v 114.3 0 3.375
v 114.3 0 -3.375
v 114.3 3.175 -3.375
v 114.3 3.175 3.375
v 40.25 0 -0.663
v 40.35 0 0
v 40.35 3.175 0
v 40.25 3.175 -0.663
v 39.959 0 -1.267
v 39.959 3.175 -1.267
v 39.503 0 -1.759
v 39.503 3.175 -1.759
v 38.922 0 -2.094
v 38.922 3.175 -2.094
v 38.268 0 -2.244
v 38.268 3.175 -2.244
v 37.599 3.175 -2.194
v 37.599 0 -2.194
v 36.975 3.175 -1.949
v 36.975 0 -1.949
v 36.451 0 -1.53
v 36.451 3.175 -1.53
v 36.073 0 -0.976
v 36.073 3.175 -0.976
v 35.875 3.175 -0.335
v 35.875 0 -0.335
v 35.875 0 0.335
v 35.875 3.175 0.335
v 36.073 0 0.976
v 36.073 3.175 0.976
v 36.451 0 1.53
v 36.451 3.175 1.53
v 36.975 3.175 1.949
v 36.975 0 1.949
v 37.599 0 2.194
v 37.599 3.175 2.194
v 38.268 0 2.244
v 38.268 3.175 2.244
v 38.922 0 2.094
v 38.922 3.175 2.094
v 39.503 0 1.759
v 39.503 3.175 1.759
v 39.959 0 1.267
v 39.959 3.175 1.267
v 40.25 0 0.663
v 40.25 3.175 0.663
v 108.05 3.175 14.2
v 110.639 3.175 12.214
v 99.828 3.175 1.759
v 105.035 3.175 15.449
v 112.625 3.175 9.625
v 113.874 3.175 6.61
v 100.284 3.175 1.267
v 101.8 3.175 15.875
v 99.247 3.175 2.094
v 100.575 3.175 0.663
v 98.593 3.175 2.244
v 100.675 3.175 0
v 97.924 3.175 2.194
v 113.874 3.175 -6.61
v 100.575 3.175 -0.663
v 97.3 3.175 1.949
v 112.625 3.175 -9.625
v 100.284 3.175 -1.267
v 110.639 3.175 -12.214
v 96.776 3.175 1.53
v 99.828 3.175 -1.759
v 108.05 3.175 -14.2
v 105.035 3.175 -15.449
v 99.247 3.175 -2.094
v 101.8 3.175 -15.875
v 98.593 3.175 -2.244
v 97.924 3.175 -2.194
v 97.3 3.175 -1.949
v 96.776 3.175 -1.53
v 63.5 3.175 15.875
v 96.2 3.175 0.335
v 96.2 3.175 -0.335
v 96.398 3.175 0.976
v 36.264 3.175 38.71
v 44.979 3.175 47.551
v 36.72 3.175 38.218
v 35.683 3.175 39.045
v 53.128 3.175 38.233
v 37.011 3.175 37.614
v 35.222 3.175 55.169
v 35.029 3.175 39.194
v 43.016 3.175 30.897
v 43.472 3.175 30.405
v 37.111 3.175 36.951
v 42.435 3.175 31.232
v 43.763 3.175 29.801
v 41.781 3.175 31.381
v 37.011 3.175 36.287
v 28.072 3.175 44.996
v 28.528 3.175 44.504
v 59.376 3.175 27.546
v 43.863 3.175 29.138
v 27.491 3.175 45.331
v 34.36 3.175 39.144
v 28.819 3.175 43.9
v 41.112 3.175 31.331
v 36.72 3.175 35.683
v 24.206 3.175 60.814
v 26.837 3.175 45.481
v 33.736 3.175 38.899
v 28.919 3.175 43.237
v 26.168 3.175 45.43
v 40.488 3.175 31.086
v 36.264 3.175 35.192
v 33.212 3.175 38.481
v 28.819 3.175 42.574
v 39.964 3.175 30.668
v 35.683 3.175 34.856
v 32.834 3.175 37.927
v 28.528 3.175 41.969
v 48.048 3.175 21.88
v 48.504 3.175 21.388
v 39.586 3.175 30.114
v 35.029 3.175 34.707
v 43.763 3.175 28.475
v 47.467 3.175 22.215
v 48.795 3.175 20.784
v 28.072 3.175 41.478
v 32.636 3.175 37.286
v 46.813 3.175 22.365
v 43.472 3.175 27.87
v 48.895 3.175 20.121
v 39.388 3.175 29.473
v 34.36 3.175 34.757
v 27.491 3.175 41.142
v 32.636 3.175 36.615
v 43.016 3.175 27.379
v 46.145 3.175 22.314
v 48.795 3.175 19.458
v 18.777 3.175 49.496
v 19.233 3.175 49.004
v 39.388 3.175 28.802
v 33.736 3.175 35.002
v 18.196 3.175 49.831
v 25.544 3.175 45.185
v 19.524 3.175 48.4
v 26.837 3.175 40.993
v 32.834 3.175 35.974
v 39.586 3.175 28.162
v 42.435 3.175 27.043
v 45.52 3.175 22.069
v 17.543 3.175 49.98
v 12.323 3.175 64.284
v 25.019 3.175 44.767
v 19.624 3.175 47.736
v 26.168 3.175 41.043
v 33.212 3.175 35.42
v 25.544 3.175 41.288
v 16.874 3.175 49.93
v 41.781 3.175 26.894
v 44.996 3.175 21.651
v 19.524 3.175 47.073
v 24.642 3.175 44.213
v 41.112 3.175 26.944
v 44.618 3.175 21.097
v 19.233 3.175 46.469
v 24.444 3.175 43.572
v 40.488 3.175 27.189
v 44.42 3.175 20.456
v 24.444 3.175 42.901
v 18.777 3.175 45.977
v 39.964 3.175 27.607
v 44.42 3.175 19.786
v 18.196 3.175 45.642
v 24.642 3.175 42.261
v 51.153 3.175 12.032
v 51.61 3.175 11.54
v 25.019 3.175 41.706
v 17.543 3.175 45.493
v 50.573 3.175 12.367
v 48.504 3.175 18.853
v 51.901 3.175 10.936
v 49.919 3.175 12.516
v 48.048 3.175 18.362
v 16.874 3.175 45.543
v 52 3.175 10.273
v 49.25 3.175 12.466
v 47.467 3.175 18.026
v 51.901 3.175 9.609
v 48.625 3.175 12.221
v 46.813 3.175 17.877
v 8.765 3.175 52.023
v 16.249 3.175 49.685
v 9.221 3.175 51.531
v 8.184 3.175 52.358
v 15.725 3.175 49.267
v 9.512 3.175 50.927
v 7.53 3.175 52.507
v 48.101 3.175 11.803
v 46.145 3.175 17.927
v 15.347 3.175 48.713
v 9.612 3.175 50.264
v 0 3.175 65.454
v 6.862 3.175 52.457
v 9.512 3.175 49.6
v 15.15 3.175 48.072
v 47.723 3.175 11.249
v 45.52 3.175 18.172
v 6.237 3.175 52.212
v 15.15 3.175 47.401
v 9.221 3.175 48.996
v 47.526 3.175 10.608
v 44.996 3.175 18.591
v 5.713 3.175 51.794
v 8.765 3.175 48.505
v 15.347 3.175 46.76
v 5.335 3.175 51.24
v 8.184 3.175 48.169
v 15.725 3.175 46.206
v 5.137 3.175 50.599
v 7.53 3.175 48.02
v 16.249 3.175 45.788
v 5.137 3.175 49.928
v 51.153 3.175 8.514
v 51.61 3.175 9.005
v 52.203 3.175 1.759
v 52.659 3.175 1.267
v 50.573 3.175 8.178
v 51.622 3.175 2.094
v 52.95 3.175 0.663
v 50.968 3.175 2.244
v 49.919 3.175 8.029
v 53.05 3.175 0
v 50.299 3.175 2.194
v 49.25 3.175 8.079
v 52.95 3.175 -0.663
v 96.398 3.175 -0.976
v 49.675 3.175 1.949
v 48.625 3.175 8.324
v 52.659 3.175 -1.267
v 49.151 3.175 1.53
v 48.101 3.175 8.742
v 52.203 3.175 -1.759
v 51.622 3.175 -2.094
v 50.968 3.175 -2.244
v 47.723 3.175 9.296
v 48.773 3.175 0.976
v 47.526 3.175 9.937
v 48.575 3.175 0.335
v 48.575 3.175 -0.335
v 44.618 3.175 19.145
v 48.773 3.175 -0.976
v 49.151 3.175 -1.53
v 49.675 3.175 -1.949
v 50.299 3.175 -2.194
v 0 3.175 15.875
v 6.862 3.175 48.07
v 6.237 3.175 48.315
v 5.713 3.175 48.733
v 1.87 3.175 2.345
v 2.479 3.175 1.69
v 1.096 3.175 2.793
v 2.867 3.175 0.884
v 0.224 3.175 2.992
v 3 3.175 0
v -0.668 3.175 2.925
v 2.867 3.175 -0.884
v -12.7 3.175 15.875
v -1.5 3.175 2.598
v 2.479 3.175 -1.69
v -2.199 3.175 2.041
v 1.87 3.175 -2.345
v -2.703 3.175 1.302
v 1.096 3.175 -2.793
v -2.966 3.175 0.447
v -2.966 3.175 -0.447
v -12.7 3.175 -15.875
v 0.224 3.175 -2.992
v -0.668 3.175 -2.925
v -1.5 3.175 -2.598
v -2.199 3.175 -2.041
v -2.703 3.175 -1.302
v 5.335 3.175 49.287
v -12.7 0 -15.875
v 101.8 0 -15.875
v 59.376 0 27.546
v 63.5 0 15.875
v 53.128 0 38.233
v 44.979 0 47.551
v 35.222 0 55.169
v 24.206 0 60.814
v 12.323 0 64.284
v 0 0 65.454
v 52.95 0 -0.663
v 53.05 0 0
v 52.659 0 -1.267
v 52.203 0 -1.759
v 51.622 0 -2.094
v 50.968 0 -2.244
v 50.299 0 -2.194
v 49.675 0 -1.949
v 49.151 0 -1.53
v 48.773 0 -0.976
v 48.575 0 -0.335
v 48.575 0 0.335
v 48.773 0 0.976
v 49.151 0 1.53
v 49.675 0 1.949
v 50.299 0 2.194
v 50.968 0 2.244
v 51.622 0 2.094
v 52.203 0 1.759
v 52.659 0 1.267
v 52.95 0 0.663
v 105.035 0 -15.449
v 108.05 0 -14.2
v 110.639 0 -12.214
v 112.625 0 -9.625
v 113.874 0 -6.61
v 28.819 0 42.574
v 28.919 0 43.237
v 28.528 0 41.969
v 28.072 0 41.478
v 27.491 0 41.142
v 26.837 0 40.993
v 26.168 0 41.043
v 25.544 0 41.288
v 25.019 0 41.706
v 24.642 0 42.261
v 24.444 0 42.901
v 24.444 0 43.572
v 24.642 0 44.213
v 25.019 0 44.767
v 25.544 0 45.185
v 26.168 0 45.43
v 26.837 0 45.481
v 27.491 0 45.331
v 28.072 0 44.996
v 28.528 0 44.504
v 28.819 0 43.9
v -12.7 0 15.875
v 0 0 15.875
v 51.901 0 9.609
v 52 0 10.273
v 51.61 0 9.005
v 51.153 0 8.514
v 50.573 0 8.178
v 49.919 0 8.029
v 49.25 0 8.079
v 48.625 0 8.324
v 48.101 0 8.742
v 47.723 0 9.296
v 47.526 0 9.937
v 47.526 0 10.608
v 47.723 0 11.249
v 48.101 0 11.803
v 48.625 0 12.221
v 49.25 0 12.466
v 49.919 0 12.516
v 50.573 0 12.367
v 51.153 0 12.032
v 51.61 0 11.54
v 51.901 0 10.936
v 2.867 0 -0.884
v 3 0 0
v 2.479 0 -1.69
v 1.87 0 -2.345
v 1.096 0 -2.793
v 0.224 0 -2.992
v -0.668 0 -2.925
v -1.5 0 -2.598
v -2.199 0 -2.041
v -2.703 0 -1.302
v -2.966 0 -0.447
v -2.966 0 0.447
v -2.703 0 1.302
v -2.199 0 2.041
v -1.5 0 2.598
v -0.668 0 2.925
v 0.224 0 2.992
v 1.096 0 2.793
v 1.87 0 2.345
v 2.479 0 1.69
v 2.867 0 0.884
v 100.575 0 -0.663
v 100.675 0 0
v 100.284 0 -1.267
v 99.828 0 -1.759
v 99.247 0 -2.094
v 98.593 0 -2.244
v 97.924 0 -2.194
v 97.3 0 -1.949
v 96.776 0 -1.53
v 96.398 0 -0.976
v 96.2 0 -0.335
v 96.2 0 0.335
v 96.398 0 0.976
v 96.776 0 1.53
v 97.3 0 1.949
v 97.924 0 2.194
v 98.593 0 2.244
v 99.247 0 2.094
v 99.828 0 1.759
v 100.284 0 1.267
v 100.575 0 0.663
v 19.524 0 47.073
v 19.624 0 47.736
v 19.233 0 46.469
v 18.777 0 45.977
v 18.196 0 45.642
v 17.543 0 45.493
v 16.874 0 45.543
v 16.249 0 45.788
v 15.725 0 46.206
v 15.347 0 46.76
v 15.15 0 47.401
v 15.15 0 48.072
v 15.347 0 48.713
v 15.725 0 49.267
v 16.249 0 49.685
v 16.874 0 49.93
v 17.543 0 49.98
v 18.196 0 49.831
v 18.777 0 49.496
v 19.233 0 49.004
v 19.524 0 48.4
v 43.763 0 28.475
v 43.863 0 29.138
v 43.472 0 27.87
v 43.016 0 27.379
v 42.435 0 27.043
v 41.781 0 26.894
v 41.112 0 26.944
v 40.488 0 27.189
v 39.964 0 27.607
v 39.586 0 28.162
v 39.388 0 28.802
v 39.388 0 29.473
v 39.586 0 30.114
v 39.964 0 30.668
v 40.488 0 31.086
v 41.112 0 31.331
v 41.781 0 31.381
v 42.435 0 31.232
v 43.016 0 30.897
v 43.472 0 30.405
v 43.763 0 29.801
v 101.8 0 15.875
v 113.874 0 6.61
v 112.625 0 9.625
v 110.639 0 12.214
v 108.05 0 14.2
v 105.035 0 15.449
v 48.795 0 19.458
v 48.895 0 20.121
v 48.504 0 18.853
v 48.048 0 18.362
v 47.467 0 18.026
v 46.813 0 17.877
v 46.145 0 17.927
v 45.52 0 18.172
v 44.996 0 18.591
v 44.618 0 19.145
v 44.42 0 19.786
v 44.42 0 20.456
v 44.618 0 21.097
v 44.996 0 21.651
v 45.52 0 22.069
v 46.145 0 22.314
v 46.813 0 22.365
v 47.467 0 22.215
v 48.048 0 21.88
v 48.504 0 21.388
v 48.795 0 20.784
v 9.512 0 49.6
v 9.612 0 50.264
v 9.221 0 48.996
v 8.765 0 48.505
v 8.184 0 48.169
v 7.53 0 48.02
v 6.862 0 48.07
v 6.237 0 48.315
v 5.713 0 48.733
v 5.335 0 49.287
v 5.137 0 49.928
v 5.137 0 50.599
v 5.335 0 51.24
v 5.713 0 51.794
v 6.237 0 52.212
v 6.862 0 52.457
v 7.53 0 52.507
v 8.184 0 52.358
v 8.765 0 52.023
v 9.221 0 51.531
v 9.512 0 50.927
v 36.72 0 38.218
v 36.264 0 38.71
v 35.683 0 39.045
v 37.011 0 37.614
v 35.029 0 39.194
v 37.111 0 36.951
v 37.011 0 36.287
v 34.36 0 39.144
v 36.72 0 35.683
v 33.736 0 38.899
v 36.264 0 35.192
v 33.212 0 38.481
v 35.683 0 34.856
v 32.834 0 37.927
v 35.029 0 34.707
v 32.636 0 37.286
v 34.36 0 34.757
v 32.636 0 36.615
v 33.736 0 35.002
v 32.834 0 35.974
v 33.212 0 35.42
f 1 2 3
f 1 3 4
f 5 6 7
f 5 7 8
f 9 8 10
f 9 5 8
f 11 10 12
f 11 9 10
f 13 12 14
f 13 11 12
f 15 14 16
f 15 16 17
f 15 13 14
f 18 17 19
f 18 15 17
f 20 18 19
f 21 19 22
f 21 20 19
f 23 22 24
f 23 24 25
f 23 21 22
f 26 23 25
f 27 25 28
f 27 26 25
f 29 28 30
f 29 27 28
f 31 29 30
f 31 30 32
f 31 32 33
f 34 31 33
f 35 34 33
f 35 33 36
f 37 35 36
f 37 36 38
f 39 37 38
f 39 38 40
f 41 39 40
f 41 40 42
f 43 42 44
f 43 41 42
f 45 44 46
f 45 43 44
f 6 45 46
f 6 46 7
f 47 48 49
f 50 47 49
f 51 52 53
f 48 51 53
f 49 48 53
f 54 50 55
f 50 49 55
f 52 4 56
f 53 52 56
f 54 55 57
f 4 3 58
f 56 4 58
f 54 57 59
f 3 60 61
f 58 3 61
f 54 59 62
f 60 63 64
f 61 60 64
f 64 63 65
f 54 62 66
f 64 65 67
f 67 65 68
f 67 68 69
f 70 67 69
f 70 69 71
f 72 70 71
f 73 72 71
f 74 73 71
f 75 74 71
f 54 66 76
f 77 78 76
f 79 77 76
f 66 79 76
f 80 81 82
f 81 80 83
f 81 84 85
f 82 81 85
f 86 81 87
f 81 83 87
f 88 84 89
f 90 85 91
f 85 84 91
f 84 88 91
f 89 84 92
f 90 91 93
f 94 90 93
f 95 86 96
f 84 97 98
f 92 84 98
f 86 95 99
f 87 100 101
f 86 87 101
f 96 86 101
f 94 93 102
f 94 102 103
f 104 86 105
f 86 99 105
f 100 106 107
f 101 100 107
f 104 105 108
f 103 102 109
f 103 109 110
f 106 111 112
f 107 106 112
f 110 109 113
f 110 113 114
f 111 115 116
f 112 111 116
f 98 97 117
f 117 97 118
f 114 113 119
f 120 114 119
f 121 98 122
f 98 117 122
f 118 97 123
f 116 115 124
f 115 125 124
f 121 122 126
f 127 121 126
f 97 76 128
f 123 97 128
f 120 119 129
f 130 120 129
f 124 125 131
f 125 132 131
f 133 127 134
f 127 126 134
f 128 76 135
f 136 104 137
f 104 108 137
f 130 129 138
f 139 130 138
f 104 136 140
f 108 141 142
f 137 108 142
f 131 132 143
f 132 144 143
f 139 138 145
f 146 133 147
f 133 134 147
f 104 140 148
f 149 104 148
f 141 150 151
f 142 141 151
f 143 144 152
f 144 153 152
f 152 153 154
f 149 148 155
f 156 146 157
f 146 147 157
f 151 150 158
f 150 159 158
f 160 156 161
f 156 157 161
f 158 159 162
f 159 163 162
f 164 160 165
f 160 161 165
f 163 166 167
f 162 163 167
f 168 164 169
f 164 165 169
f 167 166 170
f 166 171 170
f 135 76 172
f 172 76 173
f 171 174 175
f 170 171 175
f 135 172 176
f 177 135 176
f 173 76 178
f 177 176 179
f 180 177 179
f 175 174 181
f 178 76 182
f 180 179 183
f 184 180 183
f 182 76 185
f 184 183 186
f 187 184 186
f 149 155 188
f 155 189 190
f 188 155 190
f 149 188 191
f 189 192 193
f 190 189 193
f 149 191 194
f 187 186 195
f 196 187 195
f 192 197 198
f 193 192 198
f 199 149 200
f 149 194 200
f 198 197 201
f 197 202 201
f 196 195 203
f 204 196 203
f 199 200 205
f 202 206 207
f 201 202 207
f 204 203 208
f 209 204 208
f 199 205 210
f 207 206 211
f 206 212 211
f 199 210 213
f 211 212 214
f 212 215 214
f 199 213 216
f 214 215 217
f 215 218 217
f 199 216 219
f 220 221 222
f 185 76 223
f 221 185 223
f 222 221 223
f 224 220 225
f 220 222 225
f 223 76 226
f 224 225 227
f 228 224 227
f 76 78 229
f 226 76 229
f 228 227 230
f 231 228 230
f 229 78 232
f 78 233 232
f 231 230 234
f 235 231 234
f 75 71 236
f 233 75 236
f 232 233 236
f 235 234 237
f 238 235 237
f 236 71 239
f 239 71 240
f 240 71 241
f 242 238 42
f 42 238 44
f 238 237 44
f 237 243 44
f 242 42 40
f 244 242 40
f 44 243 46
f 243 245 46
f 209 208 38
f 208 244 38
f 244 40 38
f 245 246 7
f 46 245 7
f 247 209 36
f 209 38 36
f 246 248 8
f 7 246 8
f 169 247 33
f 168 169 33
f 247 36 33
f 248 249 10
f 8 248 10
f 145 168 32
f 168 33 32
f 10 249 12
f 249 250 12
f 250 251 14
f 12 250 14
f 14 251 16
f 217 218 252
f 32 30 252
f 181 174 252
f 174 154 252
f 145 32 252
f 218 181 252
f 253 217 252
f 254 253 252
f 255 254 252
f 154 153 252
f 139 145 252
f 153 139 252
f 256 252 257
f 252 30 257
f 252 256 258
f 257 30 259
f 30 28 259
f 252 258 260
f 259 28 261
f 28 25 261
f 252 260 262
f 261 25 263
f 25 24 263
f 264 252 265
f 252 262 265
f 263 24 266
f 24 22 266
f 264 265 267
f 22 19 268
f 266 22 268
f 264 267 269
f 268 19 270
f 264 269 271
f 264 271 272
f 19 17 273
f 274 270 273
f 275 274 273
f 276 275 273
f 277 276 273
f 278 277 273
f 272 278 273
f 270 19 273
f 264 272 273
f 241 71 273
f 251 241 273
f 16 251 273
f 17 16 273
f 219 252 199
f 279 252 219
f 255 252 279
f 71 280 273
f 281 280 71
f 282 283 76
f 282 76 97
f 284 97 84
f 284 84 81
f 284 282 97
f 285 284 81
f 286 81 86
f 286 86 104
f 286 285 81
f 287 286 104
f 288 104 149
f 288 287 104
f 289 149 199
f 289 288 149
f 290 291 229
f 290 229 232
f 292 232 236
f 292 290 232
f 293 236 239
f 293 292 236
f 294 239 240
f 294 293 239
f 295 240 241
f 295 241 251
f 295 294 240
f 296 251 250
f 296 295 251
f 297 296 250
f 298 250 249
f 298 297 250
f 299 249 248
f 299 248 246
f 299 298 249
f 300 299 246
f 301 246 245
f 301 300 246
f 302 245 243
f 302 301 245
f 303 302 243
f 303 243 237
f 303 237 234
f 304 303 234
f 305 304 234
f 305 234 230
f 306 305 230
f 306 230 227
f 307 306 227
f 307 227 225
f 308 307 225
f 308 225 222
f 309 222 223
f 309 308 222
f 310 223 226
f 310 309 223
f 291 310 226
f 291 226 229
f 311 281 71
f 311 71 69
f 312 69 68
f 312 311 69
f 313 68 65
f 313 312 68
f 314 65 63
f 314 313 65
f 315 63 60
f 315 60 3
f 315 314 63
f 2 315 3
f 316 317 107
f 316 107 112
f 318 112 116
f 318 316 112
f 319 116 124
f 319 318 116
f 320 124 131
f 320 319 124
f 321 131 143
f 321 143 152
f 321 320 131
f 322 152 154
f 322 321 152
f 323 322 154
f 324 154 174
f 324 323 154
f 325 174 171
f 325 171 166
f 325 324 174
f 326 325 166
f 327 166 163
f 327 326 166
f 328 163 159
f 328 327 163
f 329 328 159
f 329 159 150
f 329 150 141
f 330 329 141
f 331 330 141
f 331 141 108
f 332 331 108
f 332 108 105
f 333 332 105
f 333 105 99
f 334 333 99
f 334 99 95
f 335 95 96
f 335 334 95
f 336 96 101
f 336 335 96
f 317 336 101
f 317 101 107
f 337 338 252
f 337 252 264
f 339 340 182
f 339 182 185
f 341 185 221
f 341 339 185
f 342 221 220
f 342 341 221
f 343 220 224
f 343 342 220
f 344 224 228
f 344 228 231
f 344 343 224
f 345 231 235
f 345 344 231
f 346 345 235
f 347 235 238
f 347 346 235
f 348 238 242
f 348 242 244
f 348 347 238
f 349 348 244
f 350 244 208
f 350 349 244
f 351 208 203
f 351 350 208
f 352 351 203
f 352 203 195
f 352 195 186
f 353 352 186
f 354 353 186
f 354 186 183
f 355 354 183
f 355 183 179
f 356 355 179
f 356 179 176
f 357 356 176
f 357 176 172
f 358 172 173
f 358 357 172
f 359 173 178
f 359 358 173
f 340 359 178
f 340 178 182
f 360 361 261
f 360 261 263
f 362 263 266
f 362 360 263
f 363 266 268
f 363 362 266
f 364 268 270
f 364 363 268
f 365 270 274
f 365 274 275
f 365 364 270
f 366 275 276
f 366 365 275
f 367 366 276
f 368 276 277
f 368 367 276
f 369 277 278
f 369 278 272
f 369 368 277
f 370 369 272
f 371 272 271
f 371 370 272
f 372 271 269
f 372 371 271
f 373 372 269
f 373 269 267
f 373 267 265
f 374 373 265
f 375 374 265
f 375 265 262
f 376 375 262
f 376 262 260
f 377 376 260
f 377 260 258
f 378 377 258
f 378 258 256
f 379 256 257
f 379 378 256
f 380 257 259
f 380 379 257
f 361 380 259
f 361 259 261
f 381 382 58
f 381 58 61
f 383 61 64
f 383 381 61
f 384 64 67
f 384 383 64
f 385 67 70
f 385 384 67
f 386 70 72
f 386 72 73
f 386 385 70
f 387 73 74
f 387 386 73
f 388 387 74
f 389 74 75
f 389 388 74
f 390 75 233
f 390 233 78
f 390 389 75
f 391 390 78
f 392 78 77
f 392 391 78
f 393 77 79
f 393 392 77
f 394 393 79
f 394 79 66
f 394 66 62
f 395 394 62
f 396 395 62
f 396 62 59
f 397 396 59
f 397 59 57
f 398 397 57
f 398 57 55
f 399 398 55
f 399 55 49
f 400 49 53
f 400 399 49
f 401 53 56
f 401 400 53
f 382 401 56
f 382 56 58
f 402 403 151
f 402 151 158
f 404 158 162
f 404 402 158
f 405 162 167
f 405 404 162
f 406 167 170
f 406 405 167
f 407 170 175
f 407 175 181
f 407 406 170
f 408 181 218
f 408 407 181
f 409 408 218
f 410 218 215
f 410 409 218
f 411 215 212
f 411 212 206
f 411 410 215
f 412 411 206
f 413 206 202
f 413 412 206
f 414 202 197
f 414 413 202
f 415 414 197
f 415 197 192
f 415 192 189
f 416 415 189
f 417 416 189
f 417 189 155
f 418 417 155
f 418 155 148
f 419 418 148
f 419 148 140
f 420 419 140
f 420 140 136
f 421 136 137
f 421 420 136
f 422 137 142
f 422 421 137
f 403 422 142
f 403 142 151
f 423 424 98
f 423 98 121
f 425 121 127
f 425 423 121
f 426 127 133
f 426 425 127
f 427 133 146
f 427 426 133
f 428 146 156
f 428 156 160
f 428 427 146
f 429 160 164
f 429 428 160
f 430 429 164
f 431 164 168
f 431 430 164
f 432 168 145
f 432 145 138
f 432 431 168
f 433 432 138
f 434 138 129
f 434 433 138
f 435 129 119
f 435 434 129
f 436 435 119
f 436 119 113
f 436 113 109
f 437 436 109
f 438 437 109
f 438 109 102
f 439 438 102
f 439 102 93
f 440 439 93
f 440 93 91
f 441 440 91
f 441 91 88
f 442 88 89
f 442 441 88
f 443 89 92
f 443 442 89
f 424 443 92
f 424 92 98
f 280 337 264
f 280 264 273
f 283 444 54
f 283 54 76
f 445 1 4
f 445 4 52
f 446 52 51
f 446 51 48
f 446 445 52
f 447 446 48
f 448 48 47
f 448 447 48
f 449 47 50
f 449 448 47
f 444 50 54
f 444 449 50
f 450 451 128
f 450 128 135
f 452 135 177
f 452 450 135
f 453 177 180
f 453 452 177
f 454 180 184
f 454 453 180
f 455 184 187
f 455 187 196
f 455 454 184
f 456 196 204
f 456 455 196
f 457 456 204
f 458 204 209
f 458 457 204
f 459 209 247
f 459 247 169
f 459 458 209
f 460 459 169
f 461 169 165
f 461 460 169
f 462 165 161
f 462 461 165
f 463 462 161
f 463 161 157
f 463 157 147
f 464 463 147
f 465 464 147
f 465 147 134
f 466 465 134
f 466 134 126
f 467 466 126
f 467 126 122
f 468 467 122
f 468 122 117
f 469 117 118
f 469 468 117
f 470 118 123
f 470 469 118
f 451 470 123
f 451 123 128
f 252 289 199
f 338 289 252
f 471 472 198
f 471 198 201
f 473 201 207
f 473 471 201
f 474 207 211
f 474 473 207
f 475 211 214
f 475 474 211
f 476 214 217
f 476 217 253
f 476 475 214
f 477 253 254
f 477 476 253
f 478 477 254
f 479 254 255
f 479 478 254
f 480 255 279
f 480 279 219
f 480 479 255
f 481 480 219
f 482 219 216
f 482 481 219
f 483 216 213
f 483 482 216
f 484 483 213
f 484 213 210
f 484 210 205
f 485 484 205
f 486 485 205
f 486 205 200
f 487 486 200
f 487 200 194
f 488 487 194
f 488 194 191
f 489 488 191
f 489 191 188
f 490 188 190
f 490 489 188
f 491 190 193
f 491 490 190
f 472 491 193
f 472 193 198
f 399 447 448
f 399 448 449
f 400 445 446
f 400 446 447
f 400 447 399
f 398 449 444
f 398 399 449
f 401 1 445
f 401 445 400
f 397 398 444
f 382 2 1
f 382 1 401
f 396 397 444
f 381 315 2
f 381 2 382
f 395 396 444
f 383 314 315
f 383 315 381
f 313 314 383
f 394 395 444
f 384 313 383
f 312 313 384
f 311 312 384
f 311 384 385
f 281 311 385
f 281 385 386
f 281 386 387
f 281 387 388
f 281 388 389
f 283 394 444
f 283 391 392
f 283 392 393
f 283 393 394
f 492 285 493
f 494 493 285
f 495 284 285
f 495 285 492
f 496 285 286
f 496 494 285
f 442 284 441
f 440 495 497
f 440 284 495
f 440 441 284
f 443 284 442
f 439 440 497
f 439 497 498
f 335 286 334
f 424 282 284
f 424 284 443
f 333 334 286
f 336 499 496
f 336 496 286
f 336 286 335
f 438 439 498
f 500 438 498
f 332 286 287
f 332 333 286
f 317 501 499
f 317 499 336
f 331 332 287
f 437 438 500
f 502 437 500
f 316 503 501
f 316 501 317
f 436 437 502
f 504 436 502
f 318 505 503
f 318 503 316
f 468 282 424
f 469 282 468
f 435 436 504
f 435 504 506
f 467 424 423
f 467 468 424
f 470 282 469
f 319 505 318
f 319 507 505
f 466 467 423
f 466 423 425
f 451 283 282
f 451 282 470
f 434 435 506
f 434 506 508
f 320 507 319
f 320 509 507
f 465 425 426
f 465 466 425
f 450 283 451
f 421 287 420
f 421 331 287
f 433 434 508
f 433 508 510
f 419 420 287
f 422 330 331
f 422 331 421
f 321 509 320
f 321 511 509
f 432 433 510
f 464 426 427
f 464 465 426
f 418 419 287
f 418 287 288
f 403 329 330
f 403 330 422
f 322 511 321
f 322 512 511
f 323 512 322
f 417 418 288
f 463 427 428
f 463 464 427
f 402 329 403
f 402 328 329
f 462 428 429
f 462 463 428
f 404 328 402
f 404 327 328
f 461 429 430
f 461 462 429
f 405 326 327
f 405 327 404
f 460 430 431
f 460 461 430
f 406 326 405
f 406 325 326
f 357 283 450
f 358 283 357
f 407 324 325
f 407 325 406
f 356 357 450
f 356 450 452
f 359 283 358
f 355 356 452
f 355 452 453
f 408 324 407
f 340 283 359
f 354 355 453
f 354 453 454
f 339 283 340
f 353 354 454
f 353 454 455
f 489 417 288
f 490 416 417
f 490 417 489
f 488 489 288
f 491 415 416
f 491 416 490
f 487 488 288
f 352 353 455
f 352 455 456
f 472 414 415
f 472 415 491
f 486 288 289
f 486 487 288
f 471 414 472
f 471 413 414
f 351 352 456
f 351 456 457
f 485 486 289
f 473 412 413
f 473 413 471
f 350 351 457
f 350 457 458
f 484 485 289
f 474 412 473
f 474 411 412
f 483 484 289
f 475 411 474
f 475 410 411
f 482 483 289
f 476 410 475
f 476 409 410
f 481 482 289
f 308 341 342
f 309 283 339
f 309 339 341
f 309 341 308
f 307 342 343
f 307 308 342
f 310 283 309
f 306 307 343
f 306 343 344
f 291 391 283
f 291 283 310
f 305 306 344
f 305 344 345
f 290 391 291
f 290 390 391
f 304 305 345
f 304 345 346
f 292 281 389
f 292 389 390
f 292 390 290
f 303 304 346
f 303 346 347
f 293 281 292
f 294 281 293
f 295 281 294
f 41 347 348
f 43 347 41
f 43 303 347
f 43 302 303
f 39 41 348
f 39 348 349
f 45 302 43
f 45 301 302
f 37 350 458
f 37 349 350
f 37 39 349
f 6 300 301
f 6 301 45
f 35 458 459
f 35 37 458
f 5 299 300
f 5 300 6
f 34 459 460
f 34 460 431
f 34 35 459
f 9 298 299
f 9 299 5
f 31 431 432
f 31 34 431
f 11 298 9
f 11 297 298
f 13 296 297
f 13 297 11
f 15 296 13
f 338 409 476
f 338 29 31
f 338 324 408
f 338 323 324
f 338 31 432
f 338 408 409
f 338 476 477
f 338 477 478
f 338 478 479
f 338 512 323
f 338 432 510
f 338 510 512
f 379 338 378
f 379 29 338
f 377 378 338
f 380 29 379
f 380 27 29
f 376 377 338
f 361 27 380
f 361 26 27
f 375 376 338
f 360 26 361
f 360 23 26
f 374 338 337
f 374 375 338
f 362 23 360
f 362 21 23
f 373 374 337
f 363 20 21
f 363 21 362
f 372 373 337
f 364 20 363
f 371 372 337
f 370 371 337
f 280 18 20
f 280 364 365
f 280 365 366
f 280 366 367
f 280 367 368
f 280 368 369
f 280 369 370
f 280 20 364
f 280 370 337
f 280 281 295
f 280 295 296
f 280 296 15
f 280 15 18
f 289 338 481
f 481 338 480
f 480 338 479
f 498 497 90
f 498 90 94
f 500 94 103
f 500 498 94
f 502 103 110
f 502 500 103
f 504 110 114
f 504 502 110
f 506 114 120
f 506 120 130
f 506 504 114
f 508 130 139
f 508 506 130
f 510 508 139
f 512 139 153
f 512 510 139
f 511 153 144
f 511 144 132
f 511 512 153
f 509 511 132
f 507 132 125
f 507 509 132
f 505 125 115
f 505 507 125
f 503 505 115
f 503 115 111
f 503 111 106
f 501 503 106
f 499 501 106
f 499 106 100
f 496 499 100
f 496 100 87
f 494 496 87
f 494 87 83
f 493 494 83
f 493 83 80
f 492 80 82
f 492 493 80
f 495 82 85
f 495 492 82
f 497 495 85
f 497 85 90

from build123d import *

# Parameters (mm, degrees)
SKETCH1_R           = 3
SKETCH1_R_2         = 2.25
BOSS_EXTRUDE1_DEPTH = 3.175


with BuildPart() as part:
    # Sketch1 → Boss-Extrude1 (new body)
    with BuildSketch(Plane(origin=(0, 0, 0), x_dir=(1, 0, 0), z_dir=(0, 1, 0))):
        with BuildLine():
            Line((-12.7, -15.875), (-12.7, 15.875))
            Line((-12.7, 15.875), (101.8, 15.875))
            ThreePointArc((101.8, 15.875), (110.638834765, 12.213834765), (114.3, 3.375))
            Line((114.3, 3.375), (114.3, -3.375))
            ThreePointArc((114.3, -3.375), (110.638834765, -12.213834765), (101.8, -15.875))
            Line((101.8, -15.875), (63.5, -15.875))
            ThreePointArc((63.5, -15.875), (40.28137649, -51.591436626), (0, -65.454301807))
            Line((0, -65.454301807), (0, -15.875))
            Line((0, -15.875), (-12.7, -15.875))
        make_face()
        Circle(SKETCH1_R, mode=Mode.SUBTRACT)
        with Locations((98.425, 0)):
            Circle(SKETCH1_R_2, mode=Mode.SUBTRACT)
        with Locations((50.8, 0)):
            Circle(SKETCH1_R_2, mode=Mode.SUBTRACT)
        with Locations((49.750497609, -10.272681618)):
            Circle(SKETCH1_R_2, mode=Mode.SUBTRACT)
        with Locations((46.645354818, -20.120906389)):
            Circle(SKETCH1_R_2, mode=Mode.SUBTRACT)
        with Locations((41.612872995, -29.137755595)):
            Circle(SKETCH1_R_2, mode=Mode.SUBTRACT)
        with Locations((34.860989216, -36.950662117)):
            Circle(SKETCH1_R_2, mode=Mode.SUBTRACT)
        with Locations((26.66868451, -43.236804536)):
            Circle(SKETCH1_R_2, mode=Mode.SUBTRACT)
        with Locations((17.374456649, -47.736445785)):
            Circle(SKETCH1_R_2, mode=Mode.SUBTRACT)
        with Locations((7.362333757, -50.263665223)):
            Circle(SKETCH1_R_2, mode=Mode.SUBTRACT)
        with Locations((38.1, 0)):
            Circle(SKETCH1_R_2, mode=Mode.SUBTRACT)
    extrude(amount=BOSS_EXTRUDE1_DEPTH)


solid = part.part
